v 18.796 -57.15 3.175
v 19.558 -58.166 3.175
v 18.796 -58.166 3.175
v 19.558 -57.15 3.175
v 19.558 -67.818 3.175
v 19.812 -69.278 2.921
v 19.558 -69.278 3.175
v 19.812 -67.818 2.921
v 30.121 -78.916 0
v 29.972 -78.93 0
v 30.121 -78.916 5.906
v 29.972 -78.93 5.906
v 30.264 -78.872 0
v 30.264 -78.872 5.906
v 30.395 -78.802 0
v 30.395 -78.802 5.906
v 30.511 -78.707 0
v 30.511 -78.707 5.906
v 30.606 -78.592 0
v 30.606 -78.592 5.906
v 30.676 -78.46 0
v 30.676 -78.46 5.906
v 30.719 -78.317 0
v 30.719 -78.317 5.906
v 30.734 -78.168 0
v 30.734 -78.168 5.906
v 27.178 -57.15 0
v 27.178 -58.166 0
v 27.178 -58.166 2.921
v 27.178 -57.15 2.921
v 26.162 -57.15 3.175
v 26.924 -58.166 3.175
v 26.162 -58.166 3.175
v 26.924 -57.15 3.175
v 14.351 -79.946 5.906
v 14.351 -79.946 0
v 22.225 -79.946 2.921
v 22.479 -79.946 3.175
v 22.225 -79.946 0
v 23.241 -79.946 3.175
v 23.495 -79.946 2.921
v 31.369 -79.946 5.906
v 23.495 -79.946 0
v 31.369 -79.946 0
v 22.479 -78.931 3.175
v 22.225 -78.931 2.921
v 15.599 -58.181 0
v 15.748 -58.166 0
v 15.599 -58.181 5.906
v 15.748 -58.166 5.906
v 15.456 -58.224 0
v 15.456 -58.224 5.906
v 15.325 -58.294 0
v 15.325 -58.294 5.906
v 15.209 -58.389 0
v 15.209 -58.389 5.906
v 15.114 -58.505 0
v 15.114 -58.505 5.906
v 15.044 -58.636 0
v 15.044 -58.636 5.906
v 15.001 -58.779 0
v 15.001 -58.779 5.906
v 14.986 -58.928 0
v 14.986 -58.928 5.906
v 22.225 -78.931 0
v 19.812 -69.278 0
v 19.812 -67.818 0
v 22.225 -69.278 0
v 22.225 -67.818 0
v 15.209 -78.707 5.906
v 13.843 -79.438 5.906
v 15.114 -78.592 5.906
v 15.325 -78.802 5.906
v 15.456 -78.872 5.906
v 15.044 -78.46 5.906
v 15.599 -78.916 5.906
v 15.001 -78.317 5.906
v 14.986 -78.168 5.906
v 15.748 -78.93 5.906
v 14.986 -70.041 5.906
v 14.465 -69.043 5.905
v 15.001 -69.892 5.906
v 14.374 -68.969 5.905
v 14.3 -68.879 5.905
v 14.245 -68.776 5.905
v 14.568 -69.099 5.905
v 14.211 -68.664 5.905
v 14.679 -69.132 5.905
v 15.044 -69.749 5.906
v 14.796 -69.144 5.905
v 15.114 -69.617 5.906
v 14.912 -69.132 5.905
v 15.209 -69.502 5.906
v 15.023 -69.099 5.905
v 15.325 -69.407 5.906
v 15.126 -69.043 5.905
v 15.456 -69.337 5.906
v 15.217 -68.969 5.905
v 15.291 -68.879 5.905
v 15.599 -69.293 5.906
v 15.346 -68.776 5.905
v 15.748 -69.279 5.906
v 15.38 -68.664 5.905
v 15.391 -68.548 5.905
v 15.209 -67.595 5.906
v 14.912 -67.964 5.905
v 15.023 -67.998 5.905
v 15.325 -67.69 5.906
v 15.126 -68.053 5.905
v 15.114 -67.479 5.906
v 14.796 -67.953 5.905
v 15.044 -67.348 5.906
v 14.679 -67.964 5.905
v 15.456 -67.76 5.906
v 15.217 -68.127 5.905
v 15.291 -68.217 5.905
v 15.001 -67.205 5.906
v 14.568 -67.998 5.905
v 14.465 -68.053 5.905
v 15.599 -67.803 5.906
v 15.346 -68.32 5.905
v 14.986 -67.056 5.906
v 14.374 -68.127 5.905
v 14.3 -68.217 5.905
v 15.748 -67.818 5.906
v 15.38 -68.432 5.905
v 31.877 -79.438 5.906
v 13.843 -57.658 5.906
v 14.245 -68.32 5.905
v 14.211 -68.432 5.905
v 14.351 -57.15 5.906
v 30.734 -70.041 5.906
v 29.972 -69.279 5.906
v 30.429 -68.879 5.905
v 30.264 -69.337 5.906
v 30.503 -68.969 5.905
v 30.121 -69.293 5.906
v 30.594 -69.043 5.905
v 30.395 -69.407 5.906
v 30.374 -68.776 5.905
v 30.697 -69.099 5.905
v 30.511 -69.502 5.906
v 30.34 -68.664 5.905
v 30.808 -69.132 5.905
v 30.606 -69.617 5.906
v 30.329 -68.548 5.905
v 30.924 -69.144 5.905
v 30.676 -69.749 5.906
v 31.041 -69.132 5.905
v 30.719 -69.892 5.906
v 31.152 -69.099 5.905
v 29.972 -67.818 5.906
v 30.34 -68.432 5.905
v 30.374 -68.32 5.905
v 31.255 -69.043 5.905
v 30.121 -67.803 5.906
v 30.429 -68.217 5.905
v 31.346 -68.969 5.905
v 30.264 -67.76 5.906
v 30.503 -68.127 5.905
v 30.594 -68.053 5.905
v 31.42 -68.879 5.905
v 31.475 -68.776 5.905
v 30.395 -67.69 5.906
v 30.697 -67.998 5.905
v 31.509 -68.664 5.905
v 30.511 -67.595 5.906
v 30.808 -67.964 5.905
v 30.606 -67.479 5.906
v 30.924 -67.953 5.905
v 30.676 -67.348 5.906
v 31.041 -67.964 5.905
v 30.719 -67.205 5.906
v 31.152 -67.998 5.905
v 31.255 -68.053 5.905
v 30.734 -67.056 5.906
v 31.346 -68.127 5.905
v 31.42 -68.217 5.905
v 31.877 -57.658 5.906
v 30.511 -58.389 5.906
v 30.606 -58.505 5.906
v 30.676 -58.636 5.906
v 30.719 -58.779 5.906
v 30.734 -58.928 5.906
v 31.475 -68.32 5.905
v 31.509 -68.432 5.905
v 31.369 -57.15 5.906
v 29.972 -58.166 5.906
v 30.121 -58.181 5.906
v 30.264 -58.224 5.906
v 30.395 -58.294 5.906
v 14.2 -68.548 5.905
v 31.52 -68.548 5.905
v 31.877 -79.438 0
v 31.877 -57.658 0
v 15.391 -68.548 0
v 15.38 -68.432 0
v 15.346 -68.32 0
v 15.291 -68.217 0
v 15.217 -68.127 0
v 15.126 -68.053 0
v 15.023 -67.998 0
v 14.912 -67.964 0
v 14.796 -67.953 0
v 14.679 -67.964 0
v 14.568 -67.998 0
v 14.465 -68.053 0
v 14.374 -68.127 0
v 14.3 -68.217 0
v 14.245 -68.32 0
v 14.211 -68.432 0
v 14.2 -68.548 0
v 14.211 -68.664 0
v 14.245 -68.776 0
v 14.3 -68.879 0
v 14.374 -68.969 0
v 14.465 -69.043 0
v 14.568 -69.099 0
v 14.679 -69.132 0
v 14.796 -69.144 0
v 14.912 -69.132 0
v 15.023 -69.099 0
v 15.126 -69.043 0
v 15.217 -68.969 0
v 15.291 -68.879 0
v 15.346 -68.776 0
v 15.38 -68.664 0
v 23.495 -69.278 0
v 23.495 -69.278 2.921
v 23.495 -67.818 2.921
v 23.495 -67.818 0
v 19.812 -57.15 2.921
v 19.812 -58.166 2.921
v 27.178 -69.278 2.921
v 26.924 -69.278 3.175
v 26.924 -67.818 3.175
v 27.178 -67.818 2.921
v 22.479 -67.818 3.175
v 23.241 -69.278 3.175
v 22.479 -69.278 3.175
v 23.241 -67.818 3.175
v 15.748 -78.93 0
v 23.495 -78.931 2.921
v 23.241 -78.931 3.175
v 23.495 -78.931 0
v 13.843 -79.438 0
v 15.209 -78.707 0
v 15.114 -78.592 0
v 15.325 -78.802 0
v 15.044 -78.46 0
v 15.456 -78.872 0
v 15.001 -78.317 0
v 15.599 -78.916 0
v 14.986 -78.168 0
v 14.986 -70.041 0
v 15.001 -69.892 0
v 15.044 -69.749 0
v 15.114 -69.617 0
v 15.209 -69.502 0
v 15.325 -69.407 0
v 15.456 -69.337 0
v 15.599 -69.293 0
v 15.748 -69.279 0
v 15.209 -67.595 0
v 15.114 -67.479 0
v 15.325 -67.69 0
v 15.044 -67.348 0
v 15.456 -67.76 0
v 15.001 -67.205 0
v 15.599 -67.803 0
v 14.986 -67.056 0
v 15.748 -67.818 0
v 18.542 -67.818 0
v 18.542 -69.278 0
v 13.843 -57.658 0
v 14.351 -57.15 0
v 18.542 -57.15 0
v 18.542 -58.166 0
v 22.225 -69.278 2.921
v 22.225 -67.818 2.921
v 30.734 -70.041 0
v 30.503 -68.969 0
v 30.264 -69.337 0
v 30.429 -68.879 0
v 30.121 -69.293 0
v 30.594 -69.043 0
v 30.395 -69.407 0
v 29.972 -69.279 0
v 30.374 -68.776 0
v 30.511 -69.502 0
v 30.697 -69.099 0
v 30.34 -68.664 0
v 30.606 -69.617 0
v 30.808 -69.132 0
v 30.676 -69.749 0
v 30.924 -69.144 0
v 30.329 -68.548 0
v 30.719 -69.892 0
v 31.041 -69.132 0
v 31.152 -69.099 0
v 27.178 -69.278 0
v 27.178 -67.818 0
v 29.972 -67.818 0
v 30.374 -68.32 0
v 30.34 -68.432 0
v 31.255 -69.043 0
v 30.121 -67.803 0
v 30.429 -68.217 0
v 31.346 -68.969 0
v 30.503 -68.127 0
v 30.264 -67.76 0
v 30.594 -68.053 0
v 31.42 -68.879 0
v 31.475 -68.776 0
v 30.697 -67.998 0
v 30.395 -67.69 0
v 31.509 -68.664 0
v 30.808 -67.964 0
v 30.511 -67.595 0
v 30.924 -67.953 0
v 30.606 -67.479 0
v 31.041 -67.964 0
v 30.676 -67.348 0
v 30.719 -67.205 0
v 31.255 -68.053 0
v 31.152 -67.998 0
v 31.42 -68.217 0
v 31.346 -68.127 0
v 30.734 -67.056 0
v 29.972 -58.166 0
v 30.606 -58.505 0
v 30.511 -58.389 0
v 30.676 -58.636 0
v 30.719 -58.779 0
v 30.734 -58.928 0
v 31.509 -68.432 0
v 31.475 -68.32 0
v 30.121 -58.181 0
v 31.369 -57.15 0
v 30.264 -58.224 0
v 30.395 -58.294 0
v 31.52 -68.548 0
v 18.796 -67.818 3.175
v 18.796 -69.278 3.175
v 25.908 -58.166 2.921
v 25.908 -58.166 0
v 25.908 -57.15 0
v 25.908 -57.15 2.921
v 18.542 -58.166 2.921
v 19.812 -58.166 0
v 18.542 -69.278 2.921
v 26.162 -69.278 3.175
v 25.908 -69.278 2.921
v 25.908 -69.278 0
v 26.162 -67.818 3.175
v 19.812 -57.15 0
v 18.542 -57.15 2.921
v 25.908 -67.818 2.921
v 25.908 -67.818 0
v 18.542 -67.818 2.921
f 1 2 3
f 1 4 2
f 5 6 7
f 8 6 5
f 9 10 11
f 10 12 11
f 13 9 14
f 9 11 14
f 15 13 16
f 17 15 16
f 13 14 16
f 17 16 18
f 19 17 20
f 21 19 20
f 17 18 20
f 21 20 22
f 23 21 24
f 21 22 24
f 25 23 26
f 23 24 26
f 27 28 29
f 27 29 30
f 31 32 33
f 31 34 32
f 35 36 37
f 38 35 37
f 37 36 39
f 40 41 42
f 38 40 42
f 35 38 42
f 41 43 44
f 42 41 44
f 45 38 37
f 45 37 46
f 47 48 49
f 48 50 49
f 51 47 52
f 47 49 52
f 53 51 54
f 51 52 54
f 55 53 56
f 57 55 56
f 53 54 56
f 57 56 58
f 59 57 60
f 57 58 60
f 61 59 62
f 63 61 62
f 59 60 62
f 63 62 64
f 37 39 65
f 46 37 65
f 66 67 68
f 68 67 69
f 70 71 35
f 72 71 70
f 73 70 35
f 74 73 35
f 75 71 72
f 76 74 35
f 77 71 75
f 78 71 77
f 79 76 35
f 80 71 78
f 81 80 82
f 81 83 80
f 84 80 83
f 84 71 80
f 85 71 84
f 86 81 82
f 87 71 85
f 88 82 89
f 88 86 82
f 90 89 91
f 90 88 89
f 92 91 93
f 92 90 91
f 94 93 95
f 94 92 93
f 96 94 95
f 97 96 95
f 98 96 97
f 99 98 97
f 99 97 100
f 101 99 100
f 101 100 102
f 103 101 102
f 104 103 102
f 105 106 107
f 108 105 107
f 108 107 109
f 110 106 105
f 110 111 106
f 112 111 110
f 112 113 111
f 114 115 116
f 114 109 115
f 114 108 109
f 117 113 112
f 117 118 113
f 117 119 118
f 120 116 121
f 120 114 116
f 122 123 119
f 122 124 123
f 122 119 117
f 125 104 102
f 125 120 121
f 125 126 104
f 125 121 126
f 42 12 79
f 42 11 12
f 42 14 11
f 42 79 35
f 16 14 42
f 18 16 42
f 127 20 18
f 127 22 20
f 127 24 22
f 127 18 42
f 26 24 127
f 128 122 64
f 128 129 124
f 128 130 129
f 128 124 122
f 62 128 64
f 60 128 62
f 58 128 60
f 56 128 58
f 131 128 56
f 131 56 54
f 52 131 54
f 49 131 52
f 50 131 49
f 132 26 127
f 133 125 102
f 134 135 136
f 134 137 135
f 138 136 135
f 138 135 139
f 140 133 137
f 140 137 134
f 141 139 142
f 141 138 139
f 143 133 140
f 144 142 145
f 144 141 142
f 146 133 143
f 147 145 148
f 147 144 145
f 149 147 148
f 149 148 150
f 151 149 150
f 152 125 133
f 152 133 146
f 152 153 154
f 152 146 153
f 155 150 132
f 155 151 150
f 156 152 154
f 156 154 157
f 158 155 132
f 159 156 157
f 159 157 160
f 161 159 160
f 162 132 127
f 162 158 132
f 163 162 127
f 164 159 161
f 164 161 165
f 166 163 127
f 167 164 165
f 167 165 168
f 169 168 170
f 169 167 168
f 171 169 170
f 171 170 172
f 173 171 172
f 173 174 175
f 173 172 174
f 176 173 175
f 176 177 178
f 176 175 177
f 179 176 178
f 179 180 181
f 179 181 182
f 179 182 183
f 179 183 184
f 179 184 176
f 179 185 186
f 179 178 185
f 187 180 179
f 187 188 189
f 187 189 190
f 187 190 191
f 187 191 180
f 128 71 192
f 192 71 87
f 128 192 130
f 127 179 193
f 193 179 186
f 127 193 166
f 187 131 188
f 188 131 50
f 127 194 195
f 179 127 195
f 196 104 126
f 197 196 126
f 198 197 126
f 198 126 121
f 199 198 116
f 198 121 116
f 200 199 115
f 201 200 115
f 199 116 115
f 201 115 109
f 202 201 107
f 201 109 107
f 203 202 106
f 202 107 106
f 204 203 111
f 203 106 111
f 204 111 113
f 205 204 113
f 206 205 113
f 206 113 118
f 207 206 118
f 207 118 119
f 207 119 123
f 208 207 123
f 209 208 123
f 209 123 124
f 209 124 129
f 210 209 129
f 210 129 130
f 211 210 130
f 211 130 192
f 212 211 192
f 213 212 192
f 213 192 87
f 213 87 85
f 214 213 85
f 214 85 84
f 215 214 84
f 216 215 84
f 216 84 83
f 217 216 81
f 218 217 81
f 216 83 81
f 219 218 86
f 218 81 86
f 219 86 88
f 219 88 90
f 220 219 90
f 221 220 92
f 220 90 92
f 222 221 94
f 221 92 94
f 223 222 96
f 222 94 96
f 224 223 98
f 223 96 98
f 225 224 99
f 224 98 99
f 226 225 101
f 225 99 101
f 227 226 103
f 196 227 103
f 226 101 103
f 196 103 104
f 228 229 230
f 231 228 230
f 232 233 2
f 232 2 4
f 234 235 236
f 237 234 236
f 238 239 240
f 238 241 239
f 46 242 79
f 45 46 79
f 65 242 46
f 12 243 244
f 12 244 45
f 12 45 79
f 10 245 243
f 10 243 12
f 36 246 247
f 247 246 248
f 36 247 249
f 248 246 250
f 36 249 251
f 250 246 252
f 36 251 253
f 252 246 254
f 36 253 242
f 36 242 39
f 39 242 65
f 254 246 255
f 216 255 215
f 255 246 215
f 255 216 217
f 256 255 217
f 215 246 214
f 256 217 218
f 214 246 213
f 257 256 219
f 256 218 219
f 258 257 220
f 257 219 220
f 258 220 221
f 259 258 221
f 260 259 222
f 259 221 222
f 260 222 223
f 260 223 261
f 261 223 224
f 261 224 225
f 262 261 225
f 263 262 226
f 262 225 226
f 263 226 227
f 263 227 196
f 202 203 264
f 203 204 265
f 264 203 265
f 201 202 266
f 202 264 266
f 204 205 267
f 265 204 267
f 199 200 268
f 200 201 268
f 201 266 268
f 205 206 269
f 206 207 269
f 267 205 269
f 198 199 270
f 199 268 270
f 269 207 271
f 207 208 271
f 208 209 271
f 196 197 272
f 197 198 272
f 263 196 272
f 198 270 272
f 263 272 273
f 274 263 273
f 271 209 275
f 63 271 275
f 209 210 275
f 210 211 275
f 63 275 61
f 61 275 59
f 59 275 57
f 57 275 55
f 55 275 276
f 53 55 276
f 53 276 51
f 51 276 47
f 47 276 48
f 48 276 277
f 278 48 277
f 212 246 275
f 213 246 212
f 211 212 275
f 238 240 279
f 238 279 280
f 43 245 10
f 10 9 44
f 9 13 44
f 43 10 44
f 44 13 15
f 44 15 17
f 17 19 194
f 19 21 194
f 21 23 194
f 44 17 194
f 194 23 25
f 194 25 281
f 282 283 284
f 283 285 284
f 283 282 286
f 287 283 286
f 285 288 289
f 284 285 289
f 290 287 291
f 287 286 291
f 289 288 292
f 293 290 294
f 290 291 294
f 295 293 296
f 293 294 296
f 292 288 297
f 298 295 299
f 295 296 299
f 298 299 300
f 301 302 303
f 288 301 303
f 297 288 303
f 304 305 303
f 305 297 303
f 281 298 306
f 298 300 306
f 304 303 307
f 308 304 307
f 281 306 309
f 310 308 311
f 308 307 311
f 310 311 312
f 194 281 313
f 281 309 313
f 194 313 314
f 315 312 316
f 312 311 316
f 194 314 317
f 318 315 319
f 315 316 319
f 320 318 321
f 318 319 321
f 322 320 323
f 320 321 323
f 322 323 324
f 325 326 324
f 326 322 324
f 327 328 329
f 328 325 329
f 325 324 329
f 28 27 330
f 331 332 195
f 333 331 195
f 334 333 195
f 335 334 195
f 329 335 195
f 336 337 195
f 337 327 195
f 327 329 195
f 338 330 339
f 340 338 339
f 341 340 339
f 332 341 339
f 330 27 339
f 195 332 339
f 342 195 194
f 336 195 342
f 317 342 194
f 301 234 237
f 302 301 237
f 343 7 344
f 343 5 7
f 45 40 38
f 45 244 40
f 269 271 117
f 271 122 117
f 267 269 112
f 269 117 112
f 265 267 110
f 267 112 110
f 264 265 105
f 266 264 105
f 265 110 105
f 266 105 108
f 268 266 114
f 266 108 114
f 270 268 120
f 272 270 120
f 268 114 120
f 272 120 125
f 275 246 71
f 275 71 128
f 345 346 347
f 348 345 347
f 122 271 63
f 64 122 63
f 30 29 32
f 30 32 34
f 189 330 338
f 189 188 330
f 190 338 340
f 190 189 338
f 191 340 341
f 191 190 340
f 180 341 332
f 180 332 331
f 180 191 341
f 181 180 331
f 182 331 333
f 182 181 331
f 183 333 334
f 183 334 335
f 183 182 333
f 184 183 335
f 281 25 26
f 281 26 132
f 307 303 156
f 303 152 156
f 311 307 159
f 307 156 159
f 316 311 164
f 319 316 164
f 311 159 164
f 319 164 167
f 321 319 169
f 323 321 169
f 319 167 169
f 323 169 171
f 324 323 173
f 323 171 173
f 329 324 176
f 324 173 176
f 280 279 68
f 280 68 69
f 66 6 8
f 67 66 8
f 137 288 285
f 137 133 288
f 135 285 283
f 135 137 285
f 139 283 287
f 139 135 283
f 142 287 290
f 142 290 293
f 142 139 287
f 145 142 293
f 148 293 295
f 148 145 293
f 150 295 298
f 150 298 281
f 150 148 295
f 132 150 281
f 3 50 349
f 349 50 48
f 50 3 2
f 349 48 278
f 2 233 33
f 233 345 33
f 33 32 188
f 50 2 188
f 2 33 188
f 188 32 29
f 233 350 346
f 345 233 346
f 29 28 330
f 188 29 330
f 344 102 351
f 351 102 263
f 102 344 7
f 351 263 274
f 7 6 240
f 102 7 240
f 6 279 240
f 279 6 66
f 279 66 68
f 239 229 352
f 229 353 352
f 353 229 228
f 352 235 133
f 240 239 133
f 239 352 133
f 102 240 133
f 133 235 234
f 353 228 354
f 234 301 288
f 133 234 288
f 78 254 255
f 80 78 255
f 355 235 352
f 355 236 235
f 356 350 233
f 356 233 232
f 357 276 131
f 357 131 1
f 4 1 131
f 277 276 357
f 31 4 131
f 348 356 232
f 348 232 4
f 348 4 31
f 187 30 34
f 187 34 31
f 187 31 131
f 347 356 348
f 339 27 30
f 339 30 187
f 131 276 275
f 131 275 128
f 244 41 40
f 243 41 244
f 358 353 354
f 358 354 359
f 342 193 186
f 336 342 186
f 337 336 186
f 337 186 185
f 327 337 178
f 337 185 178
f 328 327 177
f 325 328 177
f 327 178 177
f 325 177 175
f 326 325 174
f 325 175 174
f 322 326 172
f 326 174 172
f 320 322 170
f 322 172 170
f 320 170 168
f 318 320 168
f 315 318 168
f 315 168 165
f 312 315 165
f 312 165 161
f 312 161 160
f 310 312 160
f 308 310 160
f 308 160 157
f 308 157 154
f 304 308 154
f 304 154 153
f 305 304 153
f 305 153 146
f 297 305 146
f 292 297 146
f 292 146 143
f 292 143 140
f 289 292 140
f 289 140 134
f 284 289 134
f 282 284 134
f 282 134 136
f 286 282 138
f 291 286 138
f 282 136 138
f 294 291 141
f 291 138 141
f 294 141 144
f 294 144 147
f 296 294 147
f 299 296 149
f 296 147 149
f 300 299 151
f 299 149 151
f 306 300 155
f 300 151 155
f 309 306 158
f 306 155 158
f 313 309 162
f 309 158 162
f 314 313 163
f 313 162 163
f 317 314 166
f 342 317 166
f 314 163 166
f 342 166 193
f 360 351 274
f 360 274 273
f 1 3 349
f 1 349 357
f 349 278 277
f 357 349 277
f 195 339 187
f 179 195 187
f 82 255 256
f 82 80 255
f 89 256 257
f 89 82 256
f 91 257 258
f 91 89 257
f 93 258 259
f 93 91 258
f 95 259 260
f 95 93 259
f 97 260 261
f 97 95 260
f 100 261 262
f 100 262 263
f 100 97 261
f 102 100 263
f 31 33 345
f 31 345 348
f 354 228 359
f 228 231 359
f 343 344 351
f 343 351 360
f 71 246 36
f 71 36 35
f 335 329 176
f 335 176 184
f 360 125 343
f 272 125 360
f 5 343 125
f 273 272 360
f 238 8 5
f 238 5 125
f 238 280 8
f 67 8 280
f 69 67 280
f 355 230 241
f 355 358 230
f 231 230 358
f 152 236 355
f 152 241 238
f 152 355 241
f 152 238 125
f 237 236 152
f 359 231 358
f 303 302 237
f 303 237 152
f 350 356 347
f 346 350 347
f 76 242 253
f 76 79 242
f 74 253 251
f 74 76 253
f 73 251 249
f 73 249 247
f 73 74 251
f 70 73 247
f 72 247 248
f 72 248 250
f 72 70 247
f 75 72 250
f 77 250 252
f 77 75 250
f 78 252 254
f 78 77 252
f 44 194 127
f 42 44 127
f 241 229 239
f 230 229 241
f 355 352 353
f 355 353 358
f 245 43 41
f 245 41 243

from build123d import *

# Parameters (mm, degrees)
SKETCH1_W               = 18.034
SKETCH1_H               = 22.7965
SKETCH1_W_2             = 15.748
SKETCH1_H_2             = 9.652
BOSS_EXTRUDE1_DEPTH     = 5.9055
SKETCH2_W               = 1.27
SKETCH2_H               = 1.016
SKETCH2_H_2             = 1.4605
CUT_EXTRUDE_THIN2_DEPTH = 3.175
CHAMFER1_SIZE           = 0.254
CHAMFER2_SIZE           = 0.508
FILLET1_R               = 0.762
F_0_80_TAPPED_HOLE1_D   = 1.19126


with BuildPart() as part:
    # Sketch1 → Boss-Extrude1 (new body)
    with BuildSketch(Plane.XY):
        with Locations((22.86, -68.54825)):
            Rectangle(SKETCH1_W, SKETCH1_H)
        with Locations((22.86, -62.992)):
            Rectangle(SKETCH1_W_2, SKETCH1_H_2, mode=Mode.SUBTRACT)
        with Locations((22.86, -74.1045)):
            Rectangle(SKETCH1_W_2, SKETCH1_H_2, mode=Mode.SUBTRACT)
    extrude(amount=BOSS_EXTRUDE1_DEPTH)

    # Sketch2 → Cut-Extrude-Thin2 (cut)
    with BuildSketch(Plane(origin=(0, 0, 0), x_dir=(-1, 0, 0), z_dir=(0, 0, -1))):
        with Locations((-22.86, -79.4385)):
            Rectangle(SKETCH2_W, SKETCH2_H)
        with Locations((-19.177, -57.658)):
            Rectangle(SKETCH2_W, SKETCH2_H)
        with Locations((-26.543, -57.658)):
            Rectangle(SKETCH2_W, SKETCH2_H)
        with Locations((-22.86, -68.54825)):
            Rectangle(SKETCH2_W, SKETCH2_H_2)
        with Locations((-19.177, -68.54825)):
            Rectangle(SKETCH2_W, SKETCH2_H_2)
        with Locations((-26.543, -68.54825)):
            Rectangle(SKETCH2_W, SKETCH2_H_2)
    extrude(amount=-CUT_EXTRUDE_THIN2_DEPTH, mode=Mode.SUBTRACT)

    # Chamfer1
    chamfer1_edges = [part.edges().sort_by_distance(p)[0] for p in [
        (22.225, -68.54825, 3.175),
        (23.495, -68.54825, 3.175),
        (25.908, -68.54825, 3.175),
        (27.178, -68.54825, 3.175),
        (23.495, -79.4385, 3.175),
        (22.225, -79.4385, 3.175),
        (19.812, -57.658, 3.175),
        (18.542, -57.658, 3.175),
        (27.178, -57.658, 3.175),
        (25.908, -57.658, 3.175),
        (18.542, -68.54825, 3.175),
        (19.812, -68.54825, 3.175),
    ]]
    chamfer(chamfer1_edges, length=CHAMFER1_SIZE)

    # Chamfer2
    chamfer2_edges = [part.edges().sort_by_distance(p)[0] for p in [
        (31.877, -57.15, 2.95275),
        (31.877, -79.9465, 2.95275),
        (13.843, -79.9465, 2.95275),
        (13.843, -57.15, 2.95275),
    ]]
    chamfer(chamfer2_edges, length=CHAMFER2_SIZE)

    # Fillet1
    fillet1_edges = [part.edges().sort_by_distance(p)[0] for p in [
        (30.734, -67.818, 2.95275),
        (30.734, -58.166, 2.95275),
        (14.986, -78.9305, 2.95275),
        (30.734, -78.9305, 2.95275),
        (14.986, -58.166, 2.95275),
        (14.986, -67.818, 2.95275),
        (30.734, -69.2785, 2.95275),
        (14.986, -69.2785, 2.95275),
    ]]
    fillet(fillet1_edges, radius=FILLET1_R)

    # #0-80 Tapped Hole1 (through all)
    with Locations(Plane(origin=(0, 0, 0), x_dir=(-1, 0, 0), z_dir=(0, 0, -1))):
        with Locations((-30.9245, -68.54825), (-14.7955, -68.54825)):
            Hole(F_0_80_TAPPED_HOLE1_D / 2)


solid = part.part
